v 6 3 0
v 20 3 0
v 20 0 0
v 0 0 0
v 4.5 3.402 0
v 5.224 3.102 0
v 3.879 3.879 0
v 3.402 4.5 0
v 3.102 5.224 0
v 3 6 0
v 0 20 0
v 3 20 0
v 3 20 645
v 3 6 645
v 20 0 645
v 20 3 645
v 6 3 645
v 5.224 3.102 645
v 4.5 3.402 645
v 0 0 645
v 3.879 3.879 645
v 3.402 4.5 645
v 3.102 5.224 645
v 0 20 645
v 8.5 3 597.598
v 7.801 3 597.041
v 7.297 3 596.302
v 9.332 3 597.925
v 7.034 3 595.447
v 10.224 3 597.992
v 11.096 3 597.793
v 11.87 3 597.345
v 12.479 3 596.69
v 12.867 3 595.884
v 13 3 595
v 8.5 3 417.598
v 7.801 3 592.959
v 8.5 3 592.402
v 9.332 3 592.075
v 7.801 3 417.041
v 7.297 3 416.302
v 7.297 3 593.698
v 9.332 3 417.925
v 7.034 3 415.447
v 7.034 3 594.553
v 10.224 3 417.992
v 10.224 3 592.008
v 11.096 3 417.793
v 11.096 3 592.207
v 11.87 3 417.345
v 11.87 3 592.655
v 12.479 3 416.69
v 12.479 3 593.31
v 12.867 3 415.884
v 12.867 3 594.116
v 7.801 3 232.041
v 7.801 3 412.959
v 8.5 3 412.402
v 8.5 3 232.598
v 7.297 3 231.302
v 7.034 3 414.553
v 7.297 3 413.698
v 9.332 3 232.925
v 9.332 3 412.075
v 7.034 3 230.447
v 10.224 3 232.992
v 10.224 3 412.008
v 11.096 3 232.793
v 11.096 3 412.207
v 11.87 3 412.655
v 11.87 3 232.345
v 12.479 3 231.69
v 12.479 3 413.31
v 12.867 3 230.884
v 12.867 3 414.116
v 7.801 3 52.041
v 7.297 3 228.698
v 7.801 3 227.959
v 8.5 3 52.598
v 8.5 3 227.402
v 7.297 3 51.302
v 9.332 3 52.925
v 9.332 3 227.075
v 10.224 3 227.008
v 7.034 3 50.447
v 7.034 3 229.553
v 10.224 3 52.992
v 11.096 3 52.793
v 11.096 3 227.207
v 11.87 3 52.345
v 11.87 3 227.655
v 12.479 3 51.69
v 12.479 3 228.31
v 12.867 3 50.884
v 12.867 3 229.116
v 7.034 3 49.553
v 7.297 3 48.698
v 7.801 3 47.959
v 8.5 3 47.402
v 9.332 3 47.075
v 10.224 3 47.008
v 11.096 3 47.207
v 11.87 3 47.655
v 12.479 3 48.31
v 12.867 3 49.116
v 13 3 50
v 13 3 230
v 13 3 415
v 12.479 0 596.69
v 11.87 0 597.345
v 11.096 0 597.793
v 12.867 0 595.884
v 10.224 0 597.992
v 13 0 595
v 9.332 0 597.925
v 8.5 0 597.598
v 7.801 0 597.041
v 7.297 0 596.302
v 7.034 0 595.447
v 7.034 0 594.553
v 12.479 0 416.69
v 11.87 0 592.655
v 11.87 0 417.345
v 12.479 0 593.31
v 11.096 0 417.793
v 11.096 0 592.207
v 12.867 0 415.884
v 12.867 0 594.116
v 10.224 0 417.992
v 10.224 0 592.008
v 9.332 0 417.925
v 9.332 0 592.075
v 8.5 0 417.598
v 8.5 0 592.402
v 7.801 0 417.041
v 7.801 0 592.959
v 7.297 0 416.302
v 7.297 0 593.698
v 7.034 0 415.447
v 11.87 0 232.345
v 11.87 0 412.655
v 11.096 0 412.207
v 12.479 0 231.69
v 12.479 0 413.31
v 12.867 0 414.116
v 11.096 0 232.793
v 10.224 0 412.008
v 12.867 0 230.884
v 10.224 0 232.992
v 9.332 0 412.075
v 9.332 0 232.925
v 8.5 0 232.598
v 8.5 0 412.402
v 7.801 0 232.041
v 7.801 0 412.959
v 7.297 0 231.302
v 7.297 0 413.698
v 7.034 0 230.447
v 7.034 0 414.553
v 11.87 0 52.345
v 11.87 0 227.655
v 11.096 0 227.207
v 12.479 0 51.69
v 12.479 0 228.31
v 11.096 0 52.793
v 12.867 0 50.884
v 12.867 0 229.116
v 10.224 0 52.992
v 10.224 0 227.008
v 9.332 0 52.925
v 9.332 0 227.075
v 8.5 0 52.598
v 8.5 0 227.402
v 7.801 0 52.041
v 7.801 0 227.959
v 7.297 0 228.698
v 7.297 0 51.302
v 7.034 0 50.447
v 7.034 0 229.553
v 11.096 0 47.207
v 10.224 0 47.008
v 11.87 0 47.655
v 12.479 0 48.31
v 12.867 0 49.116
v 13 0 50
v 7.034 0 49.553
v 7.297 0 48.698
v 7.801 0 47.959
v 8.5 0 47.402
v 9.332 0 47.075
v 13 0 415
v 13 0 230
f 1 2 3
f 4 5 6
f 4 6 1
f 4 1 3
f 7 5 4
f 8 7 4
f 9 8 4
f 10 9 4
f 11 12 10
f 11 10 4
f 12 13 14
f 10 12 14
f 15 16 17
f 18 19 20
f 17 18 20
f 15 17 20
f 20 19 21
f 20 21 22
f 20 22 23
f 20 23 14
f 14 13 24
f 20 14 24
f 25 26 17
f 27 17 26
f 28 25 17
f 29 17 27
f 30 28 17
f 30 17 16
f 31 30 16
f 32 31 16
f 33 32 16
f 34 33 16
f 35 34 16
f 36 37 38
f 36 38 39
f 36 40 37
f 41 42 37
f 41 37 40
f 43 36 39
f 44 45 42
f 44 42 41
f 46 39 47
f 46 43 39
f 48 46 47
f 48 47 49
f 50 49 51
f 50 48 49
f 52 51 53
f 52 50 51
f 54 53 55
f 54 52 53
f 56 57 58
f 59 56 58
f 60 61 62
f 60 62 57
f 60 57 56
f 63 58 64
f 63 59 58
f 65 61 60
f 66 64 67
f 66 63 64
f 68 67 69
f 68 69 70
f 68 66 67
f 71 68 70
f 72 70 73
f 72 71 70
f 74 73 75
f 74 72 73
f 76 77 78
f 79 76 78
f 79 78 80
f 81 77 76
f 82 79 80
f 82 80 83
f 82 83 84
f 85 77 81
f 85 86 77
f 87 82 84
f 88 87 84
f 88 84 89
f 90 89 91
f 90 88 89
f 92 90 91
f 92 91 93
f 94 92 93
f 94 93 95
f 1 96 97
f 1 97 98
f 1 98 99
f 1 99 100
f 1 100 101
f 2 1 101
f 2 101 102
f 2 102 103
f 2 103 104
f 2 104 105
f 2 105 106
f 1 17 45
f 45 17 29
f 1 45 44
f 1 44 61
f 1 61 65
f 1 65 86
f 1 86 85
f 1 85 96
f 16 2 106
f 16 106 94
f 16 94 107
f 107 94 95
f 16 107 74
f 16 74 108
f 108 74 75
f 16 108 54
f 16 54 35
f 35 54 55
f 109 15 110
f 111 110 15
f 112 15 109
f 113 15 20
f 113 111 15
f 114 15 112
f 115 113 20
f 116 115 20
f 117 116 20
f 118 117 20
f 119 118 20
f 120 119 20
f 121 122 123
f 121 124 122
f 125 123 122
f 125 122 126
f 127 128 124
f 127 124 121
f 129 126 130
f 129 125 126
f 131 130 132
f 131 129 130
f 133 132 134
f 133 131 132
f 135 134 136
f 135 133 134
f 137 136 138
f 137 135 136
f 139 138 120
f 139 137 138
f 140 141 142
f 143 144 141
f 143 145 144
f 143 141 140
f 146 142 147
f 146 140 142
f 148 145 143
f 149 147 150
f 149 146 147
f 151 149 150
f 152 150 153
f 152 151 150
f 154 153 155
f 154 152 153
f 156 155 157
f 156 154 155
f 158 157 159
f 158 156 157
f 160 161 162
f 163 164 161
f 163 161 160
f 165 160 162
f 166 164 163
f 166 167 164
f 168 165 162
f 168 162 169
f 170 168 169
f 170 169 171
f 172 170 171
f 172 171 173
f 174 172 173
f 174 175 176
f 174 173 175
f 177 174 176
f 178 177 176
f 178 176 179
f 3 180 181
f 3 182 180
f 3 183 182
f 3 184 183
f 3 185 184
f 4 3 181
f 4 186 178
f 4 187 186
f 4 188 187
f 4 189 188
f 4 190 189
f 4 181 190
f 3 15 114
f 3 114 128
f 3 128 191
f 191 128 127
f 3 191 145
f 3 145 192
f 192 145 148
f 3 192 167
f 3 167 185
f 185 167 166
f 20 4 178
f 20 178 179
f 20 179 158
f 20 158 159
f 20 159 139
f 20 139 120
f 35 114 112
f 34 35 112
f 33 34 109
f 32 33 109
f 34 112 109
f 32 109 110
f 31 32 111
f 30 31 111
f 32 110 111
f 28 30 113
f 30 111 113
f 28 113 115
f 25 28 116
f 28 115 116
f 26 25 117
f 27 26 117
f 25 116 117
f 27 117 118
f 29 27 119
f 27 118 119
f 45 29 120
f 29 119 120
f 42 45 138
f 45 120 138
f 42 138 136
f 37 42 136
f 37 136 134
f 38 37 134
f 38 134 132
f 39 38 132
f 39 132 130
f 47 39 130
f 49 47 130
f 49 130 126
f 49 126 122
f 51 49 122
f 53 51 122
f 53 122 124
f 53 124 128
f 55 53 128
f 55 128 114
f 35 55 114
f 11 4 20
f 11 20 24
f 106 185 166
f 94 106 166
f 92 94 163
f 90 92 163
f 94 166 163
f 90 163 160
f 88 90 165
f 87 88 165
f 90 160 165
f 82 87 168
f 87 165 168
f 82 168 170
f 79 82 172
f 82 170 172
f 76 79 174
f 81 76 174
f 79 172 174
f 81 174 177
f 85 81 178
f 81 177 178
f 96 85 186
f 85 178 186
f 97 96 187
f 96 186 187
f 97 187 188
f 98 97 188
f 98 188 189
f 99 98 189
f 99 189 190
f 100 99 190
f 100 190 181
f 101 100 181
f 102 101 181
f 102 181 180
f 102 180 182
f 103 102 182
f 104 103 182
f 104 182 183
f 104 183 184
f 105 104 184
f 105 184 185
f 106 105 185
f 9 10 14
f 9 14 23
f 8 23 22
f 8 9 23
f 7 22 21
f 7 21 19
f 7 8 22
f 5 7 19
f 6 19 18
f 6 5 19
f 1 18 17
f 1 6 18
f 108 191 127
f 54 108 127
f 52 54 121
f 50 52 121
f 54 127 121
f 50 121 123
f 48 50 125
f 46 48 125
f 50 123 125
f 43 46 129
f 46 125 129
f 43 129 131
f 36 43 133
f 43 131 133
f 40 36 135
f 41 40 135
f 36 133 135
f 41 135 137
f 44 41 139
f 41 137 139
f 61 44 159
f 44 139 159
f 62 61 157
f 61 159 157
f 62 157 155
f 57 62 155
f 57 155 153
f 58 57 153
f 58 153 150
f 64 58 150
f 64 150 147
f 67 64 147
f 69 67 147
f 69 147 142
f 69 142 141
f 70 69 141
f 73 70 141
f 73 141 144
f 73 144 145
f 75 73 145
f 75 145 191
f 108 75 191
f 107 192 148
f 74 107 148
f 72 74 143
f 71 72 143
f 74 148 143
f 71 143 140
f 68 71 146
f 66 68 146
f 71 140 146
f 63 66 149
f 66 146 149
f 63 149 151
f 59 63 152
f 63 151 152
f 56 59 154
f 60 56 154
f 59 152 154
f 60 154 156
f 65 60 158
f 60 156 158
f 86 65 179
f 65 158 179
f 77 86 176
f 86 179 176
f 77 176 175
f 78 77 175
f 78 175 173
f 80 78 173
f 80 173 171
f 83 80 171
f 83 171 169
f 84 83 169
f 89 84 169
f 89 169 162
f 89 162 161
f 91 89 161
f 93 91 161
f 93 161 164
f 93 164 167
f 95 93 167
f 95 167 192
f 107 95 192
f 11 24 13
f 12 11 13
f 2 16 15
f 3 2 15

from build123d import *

# Parameters (mm, degrees)
BOSS_EXTRU_1_DEPTH      = 645
ESQUISSE2_R             = 3
ENL_V_MAT_EXTRU_1_DEPTH = 955


with BuildPart() as part:
    # Esquisse1 → Boss.-Extru.1 (new body)
    with BuildSketch(Plane.XY):
        with BuildLine():
            Line((0, 0), (0, 20))
            Line((0, 20), (3, 20))
            Line((3, 20), (3, 6))
            ThreePointArc((3, 6), (3.878679656, 3.878679656), (6, 3))
            Line((6, 3), (20, 3))
            Line((20, 3), (20, 0))
            Line((20, 0), (0, 0))
        make_face()
    extrude(amount=BOSS_EXTRU_1_DEPTH)

    # Esquisse2 → Enlèv. mat.-Extru.1 (cut)
    with BuildSketch(Plane(origin=(0, 0, 0), x_dir=(-1, 0, 0), z_dir=(0, -1, 0))):
        with Locations(Location((-10, -50, 0), (0, 0, 180))):
            Circle(ESQUISSE2_R)
        with Locations(Location((-10, -595, 0), (0, 0, 180))):
            Circle(ESQUISSE2_R)
        with Locations(Location((-10, -230, 0), (0, 0, 180))):
            Circle(ESQUISSE2_R)
        with Locations(Location((-10, -415, 0), (0, 0, 180))):
            Circle(ESQUISSE2_R)
    extrude(amount=-ENL_V_MAT_EXTRU_1_DEPTH, mode=Mode.SUBTRACT)


solid = part.part
